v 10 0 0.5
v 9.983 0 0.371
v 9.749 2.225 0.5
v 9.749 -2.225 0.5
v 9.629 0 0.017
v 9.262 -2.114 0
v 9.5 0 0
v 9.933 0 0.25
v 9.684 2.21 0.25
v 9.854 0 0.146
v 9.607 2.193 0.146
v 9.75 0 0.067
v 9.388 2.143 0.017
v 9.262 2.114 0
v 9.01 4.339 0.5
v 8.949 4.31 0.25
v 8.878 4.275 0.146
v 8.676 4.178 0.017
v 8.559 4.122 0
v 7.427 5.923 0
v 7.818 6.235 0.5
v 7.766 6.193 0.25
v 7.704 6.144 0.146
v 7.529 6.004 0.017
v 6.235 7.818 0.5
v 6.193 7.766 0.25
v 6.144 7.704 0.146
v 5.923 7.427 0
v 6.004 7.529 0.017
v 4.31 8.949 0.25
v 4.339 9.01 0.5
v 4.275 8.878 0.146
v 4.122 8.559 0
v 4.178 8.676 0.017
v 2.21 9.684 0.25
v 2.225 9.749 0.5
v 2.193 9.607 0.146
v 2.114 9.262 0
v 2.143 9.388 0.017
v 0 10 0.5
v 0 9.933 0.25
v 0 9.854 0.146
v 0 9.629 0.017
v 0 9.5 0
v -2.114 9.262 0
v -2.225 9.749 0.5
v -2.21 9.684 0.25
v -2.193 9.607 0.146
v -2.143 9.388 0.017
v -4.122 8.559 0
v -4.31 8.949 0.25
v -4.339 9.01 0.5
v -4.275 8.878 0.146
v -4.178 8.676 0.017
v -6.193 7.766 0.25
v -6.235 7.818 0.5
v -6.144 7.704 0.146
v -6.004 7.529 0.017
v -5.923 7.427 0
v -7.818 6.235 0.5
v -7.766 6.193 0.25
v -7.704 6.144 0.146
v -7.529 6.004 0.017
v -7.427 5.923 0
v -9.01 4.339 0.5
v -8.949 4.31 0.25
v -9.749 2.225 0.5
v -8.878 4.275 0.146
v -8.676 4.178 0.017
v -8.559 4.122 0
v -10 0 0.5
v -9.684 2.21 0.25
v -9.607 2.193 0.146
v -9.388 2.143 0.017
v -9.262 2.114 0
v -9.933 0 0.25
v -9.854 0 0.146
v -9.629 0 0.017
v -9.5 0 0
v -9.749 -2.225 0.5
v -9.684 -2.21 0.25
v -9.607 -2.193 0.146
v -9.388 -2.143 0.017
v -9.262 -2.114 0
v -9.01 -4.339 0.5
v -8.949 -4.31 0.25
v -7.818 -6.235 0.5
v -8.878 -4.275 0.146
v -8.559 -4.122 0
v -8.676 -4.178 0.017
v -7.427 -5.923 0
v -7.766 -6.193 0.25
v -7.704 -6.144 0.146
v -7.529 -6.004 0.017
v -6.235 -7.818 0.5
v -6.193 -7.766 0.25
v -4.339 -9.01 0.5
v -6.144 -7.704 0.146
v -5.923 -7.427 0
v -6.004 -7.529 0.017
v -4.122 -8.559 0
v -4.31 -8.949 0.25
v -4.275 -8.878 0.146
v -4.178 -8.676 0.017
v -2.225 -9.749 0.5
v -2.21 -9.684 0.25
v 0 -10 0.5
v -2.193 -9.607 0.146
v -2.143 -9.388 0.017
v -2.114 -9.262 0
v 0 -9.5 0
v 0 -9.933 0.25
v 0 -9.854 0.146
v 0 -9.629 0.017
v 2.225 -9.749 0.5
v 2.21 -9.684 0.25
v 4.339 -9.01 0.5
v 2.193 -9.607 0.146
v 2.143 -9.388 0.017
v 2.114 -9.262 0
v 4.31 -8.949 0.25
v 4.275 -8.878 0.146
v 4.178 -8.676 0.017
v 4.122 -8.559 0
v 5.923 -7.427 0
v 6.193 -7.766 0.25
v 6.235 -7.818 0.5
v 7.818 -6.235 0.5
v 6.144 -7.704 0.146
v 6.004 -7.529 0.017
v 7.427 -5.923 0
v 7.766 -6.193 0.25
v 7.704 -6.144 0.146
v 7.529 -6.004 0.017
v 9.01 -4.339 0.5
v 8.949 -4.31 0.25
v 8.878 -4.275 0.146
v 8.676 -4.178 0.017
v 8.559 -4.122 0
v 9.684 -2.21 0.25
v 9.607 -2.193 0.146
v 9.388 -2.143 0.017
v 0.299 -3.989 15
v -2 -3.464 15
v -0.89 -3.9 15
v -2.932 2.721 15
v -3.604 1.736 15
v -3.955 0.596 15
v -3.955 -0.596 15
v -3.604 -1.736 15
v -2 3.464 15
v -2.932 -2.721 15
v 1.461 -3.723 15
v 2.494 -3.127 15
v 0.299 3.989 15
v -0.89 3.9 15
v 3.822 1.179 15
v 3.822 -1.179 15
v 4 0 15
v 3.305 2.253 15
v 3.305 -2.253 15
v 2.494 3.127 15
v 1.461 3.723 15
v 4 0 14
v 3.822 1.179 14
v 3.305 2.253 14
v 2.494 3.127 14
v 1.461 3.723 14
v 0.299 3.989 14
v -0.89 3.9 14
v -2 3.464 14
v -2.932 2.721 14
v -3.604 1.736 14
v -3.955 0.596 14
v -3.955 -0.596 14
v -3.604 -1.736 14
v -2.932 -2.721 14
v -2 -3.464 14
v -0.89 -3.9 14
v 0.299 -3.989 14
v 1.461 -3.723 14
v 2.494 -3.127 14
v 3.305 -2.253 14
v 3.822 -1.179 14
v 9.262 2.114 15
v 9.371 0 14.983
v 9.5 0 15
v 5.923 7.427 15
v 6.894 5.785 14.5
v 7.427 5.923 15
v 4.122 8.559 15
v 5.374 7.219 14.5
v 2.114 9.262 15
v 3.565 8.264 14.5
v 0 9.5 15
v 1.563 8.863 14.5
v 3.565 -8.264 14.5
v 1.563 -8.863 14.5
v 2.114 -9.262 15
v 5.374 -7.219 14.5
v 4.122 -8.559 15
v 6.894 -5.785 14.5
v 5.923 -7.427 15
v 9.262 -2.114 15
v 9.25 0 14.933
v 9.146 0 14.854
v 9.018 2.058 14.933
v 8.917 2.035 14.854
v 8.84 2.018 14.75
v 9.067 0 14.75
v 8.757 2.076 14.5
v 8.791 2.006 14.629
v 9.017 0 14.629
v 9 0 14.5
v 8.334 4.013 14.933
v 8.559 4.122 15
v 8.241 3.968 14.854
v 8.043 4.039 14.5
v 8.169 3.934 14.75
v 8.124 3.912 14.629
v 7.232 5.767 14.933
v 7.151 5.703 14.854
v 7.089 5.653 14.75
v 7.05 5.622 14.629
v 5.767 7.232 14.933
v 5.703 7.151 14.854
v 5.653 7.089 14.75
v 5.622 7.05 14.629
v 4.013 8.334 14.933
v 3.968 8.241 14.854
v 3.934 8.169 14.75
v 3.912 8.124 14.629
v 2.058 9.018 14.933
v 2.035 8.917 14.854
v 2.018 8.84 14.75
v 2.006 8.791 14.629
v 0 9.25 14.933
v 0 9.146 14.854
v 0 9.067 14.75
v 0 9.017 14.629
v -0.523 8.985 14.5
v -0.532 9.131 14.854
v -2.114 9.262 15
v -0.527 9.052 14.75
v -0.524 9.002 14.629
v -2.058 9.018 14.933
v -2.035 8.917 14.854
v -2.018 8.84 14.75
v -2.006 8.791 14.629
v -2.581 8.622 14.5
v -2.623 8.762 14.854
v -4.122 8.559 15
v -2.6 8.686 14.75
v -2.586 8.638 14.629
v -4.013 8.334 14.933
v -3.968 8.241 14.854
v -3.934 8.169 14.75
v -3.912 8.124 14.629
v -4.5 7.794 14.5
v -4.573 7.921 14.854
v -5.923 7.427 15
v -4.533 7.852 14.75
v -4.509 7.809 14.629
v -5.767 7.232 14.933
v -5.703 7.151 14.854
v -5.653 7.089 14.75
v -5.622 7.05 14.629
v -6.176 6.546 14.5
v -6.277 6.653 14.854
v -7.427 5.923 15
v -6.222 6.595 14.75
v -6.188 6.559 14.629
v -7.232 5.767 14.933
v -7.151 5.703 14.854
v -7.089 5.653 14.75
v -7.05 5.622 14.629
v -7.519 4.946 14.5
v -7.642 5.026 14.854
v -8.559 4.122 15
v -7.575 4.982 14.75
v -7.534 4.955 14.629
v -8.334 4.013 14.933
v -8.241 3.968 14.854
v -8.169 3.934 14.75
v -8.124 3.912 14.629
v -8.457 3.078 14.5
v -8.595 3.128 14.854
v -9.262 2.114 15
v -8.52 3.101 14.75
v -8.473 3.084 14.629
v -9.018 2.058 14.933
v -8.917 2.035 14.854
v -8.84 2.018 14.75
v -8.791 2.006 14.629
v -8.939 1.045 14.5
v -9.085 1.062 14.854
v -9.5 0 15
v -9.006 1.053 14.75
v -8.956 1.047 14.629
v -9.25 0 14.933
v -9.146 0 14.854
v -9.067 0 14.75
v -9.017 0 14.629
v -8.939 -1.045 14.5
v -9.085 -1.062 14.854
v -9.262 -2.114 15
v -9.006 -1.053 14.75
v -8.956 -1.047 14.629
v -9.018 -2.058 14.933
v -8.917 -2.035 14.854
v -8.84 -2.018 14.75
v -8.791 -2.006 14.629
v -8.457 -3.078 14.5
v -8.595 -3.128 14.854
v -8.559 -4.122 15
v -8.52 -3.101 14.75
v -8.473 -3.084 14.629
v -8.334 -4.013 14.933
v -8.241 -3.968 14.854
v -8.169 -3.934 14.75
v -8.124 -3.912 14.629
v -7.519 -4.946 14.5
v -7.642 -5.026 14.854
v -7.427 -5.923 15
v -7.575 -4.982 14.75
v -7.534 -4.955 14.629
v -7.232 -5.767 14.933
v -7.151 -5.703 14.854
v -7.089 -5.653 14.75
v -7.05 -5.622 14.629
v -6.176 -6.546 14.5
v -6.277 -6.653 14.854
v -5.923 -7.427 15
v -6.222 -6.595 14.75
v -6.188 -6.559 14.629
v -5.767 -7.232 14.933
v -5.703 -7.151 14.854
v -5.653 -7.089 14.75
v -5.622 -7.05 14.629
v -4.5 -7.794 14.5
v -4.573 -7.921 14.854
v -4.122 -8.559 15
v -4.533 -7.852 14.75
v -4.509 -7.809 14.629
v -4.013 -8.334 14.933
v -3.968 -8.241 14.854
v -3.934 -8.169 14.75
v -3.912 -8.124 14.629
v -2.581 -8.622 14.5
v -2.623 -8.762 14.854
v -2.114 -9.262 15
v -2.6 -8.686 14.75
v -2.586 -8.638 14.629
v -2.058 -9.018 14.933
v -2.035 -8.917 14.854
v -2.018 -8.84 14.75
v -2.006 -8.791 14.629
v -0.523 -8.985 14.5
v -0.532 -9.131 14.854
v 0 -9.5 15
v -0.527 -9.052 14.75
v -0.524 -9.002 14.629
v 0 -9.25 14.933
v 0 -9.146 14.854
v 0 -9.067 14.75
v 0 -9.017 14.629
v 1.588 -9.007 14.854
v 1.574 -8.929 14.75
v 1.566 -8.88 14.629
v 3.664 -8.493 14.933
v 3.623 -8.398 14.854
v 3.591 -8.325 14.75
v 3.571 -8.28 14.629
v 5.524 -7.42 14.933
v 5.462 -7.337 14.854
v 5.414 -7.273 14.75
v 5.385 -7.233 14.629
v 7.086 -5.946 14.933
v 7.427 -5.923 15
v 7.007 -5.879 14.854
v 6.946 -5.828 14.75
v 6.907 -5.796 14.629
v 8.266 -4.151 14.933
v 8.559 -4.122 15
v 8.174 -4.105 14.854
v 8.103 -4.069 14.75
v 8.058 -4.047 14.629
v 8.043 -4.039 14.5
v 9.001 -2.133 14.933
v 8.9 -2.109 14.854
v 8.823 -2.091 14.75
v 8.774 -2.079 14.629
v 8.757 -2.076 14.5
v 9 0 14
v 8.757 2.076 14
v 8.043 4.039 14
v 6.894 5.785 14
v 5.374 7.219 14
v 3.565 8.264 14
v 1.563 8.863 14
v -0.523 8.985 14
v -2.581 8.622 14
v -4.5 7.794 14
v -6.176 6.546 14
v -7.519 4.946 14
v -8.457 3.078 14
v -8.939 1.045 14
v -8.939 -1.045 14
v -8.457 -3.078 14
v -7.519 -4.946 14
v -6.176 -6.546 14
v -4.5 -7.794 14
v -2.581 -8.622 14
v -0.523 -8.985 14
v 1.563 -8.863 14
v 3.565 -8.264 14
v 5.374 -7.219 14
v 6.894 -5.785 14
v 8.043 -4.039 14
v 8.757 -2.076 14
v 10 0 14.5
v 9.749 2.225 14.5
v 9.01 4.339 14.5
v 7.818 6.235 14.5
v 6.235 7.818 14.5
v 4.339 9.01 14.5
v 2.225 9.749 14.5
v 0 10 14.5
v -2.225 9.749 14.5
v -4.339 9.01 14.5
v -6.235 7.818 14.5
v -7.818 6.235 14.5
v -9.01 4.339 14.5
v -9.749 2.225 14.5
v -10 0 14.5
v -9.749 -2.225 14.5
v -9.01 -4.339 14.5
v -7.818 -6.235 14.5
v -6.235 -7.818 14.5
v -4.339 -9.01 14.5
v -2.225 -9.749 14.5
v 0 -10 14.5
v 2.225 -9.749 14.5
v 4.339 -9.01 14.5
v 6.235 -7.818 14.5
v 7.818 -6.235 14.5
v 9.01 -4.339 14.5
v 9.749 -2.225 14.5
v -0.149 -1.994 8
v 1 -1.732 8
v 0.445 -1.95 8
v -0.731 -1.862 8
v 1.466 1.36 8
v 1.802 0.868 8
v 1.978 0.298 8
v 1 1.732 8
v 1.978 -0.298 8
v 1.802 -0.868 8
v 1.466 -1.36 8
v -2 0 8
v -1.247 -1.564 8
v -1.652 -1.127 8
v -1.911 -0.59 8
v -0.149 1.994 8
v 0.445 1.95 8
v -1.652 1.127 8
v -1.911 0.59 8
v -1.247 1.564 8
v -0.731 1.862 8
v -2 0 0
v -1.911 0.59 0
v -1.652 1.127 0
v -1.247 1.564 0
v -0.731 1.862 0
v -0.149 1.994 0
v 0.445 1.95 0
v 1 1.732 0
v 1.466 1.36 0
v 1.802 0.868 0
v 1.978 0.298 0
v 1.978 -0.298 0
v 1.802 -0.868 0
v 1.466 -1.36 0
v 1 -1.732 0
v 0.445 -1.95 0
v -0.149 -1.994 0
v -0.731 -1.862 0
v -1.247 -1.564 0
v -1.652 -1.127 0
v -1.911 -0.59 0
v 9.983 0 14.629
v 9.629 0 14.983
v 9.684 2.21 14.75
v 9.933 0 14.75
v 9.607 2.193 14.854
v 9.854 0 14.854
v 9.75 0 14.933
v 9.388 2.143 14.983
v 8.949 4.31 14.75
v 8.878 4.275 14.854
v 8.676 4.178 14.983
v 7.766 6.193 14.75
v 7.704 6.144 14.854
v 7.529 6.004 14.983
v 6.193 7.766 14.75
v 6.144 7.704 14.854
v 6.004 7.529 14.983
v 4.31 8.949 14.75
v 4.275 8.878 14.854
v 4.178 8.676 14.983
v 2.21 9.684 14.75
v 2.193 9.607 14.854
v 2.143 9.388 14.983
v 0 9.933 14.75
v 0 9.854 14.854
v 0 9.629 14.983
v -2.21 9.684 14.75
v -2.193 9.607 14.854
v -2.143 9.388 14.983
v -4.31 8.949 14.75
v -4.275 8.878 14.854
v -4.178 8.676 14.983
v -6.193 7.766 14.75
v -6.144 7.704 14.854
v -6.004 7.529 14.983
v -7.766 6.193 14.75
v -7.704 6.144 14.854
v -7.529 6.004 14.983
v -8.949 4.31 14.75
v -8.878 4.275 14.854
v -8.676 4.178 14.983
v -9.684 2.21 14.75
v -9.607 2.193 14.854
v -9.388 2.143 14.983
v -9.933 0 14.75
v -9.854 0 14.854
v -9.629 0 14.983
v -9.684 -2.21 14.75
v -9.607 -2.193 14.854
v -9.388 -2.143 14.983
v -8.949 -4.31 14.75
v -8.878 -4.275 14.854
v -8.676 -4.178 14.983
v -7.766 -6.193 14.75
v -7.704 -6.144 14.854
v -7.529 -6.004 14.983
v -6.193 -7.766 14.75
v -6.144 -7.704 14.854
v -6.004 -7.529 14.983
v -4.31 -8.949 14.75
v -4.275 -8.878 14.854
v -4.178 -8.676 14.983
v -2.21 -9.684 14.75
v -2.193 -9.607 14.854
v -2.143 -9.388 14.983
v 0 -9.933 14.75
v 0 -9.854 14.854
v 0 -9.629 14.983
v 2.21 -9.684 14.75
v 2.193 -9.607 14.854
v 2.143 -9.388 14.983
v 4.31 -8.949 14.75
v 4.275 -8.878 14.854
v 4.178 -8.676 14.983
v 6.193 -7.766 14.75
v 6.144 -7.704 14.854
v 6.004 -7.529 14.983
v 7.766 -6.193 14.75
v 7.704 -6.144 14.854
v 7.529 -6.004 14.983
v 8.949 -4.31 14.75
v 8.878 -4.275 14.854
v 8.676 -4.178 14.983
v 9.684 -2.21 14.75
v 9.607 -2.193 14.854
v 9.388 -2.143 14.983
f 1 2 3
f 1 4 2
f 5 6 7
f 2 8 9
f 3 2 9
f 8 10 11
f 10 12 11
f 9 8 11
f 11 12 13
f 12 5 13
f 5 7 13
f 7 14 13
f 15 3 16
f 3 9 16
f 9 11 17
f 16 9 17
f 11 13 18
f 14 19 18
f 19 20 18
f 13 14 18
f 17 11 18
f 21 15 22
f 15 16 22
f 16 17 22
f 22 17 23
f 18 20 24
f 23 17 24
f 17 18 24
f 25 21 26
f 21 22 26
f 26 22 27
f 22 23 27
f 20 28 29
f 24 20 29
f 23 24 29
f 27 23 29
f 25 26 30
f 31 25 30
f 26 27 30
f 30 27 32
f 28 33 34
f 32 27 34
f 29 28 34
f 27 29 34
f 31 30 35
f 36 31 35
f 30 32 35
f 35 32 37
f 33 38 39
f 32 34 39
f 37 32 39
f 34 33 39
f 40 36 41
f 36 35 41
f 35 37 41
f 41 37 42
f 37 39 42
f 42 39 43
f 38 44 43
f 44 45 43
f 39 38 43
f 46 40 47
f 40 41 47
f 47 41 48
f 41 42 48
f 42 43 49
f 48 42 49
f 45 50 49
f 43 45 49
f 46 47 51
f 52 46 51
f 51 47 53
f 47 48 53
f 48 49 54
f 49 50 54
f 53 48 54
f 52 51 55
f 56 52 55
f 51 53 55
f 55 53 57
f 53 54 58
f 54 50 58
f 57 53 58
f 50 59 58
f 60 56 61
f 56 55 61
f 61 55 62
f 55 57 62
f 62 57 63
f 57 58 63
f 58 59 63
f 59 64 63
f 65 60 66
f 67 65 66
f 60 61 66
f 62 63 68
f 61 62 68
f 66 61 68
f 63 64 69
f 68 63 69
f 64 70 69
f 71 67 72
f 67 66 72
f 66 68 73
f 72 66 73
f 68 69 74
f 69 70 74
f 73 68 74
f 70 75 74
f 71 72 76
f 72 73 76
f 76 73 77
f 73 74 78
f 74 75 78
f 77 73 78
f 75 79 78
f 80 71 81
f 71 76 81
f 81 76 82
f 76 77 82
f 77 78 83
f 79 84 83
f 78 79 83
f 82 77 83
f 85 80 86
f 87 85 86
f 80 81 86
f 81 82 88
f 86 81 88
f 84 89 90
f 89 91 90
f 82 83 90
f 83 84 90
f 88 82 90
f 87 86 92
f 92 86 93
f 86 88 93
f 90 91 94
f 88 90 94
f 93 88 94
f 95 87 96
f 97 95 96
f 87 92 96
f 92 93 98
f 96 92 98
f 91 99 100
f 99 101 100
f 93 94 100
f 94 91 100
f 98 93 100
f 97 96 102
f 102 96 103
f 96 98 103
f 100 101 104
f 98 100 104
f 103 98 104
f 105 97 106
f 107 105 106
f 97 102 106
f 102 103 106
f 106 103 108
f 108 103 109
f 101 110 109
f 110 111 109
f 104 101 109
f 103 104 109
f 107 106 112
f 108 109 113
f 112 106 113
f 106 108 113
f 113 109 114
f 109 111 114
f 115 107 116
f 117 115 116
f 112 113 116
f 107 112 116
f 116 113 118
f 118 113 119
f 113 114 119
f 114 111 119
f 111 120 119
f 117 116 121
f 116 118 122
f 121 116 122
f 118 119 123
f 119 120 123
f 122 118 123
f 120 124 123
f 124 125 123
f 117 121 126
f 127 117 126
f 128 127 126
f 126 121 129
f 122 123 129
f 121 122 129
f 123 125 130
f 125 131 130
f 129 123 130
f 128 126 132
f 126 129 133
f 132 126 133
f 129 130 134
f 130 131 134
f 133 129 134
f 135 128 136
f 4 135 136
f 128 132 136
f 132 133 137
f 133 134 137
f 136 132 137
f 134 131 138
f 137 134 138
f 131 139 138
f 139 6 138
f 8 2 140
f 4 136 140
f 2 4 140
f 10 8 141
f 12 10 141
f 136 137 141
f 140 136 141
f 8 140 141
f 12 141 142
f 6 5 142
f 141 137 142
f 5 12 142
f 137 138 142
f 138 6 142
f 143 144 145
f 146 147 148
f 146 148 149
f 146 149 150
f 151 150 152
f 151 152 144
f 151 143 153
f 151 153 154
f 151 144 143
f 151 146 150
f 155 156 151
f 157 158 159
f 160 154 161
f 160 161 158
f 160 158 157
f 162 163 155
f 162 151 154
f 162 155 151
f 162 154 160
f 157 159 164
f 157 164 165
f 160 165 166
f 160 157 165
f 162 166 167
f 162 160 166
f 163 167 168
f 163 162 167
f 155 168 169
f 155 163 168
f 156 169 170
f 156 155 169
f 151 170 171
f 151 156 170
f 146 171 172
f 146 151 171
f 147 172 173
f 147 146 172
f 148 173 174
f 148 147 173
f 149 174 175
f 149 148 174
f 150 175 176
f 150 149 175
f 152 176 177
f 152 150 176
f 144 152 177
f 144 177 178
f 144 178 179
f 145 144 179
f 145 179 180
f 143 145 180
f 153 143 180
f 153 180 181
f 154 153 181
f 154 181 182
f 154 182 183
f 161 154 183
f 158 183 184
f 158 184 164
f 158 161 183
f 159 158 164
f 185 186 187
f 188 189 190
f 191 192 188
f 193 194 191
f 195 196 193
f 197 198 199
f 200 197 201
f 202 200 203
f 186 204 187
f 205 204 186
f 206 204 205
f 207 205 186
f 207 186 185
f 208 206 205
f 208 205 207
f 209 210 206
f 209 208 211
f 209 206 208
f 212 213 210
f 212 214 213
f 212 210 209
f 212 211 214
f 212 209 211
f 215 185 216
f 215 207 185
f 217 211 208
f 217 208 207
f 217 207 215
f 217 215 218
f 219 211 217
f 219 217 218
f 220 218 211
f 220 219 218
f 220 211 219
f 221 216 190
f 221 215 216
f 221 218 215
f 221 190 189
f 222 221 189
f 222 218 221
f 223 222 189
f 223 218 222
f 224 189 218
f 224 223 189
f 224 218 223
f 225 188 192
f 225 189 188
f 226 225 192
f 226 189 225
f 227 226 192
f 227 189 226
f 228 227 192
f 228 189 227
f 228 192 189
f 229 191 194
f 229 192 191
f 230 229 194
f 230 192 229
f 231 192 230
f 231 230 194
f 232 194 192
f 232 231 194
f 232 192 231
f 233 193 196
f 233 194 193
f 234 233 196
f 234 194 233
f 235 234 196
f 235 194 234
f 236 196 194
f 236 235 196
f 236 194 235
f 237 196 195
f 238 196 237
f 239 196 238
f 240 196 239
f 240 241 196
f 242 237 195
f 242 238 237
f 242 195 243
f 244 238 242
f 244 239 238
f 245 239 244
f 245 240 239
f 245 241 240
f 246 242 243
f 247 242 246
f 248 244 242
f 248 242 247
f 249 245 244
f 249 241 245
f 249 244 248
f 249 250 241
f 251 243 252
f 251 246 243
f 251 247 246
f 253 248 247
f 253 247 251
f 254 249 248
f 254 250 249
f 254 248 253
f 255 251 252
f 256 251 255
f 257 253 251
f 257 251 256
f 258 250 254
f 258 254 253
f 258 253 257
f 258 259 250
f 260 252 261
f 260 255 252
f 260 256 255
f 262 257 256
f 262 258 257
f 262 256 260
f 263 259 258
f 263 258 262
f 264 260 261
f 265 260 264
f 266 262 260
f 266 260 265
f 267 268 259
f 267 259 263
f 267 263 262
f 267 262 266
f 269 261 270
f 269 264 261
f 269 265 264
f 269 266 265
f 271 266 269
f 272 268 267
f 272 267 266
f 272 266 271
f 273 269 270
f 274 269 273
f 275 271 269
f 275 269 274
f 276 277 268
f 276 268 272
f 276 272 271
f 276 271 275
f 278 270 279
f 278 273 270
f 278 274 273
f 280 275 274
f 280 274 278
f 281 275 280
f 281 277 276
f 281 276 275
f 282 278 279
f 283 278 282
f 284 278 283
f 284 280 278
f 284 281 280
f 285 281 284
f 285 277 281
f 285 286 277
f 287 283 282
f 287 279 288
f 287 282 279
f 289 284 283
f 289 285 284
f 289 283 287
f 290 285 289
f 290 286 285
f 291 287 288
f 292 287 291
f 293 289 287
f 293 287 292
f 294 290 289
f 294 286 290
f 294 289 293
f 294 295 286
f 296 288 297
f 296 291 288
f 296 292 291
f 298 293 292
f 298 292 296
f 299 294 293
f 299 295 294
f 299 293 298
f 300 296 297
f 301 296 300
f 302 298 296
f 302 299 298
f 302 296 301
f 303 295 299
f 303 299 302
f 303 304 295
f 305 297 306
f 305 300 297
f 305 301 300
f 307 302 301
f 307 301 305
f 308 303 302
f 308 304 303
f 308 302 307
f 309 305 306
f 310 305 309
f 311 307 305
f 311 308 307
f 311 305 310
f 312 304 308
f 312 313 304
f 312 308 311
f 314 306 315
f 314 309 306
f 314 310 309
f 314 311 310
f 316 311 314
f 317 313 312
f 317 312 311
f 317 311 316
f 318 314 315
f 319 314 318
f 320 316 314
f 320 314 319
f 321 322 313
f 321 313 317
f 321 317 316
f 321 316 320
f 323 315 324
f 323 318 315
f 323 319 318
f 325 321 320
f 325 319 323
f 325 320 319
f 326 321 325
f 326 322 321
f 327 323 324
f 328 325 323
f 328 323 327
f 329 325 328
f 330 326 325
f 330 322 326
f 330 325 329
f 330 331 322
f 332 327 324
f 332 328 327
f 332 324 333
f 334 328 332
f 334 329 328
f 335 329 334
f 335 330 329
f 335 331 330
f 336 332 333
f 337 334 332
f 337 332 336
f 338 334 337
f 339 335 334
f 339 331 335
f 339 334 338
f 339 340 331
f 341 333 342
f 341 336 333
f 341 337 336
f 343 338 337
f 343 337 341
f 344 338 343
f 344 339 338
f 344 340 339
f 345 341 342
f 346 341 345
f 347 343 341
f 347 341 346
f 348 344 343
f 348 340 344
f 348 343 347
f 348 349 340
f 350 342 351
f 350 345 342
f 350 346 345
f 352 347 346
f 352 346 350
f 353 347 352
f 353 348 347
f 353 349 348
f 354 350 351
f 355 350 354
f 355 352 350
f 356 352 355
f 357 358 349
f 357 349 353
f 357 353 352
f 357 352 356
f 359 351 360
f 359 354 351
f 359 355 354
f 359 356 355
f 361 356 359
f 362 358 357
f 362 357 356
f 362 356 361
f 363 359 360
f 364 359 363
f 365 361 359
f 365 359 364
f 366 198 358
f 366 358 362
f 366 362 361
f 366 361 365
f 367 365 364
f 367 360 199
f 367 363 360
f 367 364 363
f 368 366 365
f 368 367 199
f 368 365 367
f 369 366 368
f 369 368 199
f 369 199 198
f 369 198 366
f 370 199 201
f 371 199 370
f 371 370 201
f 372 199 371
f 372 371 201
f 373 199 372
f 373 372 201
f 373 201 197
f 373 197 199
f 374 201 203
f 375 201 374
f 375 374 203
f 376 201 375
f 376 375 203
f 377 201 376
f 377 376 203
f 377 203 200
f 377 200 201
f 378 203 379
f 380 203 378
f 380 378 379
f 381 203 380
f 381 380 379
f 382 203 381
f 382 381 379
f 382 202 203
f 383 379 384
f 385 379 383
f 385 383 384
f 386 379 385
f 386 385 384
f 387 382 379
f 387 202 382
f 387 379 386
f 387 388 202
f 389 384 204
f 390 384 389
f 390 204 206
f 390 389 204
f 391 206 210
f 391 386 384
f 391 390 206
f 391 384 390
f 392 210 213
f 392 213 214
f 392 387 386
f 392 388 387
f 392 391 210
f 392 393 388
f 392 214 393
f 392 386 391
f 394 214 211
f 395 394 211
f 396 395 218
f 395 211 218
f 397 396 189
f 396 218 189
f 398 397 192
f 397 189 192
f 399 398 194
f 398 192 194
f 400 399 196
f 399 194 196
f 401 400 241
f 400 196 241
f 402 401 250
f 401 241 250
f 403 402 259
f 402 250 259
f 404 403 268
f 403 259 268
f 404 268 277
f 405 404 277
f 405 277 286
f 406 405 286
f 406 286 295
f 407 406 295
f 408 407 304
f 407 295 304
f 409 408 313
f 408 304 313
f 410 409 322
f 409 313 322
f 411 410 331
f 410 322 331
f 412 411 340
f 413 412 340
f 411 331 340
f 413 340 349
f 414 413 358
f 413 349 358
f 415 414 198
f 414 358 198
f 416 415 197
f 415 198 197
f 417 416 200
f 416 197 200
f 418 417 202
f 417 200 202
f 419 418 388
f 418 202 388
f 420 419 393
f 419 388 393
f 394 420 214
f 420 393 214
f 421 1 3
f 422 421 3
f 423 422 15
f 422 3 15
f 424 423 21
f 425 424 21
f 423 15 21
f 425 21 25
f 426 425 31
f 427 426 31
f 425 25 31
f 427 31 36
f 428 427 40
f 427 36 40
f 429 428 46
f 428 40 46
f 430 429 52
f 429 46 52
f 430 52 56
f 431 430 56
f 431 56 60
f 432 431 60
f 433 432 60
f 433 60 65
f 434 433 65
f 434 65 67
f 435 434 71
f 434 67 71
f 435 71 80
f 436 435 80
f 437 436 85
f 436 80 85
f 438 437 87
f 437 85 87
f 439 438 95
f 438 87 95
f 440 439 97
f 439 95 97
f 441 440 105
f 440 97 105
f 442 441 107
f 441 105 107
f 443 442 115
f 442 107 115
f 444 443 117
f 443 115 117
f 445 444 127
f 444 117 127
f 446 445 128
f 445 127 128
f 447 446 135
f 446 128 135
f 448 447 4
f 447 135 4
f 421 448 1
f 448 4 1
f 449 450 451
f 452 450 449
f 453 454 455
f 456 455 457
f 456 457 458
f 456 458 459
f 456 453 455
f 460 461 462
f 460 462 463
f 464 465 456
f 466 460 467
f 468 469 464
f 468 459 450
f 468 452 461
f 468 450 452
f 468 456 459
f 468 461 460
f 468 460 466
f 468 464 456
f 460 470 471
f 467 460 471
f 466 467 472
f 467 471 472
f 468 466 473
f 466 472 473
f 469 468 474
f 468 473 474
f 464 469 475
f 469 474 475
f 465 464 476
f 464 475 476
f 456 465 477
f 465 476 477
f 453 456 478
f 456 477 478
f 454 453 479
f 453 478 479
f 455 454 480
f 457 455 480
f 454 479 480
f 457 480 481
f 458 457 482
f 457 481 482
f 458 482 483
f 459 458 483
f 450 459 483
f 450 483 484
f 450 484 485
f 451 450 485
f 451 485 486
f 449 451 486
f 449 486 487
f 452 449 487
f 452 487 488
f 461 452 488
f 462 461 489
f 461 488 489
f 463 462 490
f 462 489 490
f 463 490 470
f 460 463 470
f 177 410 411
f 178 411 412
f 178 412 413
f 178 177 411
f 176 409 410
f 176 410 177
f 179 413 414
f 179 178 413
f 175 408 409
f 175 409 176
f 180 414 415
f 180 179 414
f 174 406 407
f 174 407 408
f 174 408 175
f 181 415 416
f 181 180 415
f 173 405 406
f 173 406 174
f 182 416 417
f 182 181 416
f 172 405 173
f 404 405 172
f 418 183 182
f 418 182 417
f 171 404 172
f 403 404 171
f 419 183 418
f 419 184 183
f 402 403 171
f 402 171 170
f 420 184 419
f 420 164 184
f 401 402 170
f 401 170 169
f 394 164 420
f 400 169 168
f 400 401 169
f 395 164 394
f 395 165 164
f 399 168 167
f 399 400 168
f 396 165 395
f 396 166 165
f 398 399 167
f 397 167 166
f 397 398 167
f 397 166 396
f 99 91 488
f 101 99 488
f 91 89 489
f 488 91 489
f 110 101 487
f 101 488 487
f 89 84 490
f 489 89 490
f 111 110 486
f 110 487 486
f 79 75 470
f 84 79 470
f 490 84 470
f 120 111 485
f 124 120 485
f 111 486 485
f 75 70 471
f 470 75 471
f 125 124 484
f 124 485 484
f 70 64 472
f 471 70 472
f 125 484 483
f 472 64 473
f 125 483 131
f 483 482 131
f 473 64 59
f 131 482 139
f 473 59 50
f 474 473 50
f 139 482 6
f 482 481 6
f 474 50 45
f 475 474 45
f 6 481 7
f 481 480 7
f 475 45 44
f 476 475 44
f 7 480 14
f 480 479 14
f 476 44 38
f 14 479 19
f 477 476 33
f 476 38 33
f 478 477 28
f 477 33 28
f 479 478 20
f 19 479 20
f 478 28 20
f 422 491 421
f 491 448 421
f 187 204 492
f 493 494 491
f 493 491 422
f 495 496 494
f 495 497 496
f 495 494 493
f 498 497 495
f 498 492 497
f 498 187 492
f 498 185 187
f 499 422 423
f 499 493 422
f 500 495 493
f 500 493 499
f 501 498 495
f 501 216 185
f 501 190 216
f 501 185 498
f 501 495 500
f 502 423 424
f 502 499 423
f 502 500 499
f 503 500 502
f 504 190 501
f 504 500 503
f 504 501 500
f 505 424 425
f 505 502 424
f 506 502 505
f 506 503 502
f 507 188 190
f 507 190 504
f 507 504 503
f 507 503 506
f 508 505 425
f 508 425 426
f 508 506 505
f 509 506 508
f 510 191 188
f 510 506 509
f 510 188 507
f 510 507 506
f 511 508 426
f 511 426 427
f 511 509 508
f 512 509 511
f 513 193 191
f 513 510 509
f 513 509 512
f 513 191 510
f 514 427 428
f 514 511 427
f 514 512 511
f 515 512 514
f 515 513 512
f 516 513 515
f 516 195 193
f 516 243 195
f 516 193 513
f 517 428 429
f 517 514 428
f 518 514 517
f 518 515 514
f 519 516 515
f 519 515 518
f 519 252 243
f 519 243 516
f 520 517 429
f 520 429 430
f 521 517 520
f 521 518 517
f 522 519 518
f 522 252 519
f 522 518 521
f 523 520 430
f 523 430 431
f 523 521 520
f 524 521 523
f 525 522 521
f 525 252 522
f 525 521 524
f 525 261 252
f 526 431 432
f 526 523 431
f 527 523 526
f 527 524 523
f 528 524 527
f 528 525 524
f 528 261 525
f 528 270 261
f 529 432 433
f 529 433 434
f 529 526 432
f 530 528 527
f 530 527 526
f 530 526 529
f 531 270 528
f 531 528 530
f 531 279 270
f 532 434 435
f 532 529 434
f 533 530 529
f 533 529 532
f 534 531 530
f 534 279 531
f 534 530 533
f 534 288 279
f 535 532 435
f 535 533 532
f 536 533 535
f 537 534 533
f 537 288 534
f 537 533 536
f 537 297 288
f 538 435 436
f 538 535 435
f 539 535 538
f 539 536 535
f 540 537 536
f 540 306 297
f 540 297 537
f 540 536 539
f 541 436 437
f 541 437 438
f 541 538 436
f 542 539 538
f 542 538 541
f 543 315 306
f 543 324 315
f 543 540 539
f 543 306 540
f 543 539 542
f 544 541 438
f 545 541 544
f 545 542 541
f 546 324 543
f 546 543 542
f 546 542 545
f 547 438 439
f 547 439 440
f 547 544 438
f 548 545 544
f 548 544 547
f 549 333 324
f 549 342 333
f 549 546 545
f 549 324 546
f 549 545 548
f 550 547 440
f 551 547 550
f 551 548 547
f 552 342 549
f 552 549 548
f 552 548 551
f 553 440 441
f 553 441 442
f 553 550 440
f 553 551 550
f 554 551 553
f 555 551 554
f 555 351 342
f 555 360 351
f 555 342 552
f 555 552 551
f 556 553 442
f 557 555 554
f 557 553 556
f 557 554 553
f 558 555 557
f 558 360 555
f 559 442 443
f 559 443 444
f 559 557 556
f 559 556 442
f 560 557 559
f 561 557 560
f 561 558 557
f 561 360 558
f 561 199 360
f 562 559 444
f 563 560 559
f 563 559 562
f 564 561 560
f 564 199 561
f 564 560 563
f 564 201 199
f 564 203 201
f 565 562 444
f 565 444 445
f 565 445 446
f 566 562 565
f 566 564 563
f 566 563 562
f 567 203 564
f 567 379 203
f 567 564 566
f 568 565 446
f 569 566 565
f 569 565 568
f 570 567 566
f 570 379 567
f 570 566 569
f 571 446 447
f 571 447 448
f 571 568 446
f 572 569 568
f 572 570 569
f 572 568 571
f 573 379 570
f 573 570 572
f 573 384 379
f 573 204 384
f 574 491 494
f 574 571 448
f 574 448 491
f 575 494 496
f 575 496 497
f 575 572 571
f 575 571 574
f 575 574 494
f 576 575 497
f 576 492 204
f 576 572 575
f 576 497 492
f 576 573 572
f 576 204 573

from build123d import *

# Parameters (mm, degrees)
SKETCH_1_R          = 10
EXTRUDE_1_DEPTH     = 15
SKETCH_2_R          = 9
SKETCH_2_R_2        = 4
CUT_EXTRUDE_1_DEPTH = 1
FILLET_1_R          = 0.5
SKETCH_3_R          = 2
CUT_EXTRUDE_2_DEPTH = 8


with BuildPart() as part:
    # 草图1 → 凸台-拉伸1 (new body)
    with BuildSketch(Plane.XY):
        Circle(SKETCH_1_R)
    extrude(amount=EXTRUDE_1_DEPTH)

    # 草图2 → 切除-拉伸1 (cut)
    with BuildSketch(Plane.XY.offset(15)):
        Circle(SKETCH_2_R)
        Circle(SKETCH_2_R_2, mode=Mode.SUBTRACT)
    extrude(amount=-CUT_EXTRUDE_1_DEPTH, mode=Mode.SUBTRACT)

    # 圆角1
    fillet_1_edges = [part.edges().sort_by_distance(p)[0] for p in [
        (-10, 0, 0),
        (-10, 0, 15),
        (-9, 0, 15),
    ]]
    fillet(fillet_1_edges, radius=FILLET_1_R - 0.0001)  # a hair under: the kernel refuses the full size

    # 草图3 → 切除-拉伸2 (cut)
    with BuildSketch(Plane(origin=(0, 0, 0), x_dir=(-1, 0, 0), z_dir=(0, 0, -1))):
        Circle(SKETCH_3_R)
    extrude(amount=-CUT_EXTRUDE_2_DEPTH, mode=Mode.SUBTRACT)


solid = part.part
